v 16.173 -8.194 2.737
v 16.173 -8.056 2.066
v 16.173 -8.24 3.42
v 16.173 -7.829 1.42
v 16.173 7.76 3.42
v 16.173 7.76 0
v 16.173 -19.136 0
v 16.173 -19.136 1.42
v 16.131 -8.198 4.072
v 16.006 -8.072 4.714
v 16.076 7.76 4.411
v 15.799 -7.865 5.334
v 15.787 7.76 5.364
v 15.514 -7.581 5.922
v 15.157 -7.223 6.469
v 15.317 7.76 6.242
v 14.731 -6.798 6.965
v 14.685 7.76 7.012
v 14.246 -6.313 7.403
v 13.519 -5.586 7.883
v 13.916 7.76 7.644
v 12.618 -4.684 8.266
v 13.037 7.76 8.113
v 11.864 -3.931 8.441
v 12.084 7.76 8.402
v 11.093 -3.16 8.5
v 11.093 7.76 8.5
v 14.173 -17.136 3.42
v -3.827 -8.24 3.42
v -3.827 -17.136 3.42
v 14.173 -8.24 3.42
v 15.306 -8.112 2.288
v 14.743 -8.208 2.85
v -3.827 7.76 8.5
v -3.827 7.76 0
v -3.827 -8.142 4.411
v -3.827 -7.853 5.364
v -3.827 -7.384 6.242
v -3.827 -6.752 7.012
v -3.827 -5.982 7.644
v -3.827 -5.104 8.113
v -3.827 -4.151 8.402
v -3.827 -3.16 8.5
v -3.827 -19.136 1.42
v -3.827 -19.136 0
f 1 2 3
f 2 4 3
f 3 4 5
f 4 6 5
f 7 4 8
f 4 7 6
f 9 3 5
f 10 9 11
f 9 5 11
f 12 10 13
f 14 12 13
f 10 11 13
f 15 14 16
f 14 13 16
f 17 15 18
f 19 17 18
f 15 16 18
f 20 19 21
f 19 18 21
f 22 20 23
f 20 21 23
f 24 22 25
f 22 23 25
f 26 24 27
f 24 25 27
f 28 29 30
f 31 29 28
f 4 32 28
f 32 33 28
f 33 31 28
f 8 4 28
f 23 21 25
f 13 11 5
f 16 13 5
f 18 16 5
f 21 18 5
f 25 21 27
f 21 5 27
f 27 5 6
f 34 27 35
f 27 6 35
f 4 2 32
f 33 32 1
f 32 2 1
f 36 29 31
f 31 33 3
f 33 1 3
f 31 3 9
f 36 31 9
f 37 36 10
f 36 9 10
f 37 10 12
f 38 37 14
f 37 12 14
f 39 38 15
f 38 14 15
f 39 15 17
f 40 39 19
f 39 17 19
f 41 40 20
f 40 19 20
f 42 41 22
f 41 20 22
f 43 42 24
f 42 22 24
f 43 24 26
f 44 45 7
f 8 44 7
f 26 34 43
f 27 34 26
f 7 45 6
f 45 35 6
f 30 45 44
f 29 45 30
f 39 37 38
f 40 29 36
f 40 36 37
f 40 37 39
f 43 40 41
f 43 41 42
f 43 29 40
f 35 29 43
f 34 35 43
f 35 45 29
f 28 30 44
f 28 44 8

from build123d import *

# Parameters (mm, degrees)
F1_DEPTH = 8.5
F2_R     = 5.08
F3_DEPTH = 10.8966
F4_SIZE  = 2


# Not quite as in the source:
# - a feature of the source that left no trace in its solid (it failed there, or was rolled back) is left out


with BuildPart() as f1:
    # F0 (on Top) → F1 (new body)
    with BuildSketch(Plane.XY):
        with BuildLine():
            Line((8.9732294485, 7.7602798555), (-3.8267705515, 7.7602798555))
            Line((-3.8267705515, 7.7602798555), (-3.8267705515, -8.2397201445))
            ThreePointArc((-3.8267705515, -8.2397201445), (-0.2330190264, 2.0052786354), (8.9732294485, 7.7602798555))
        make_face()
        with BuildLine():
            Line((16.1732294485, 7.7602798555), (8.9732294485, 7.7602798555))
            ThreePointArc((8.9732294485, 7.7602798555), (-0.2330190264, 2.0052786354), (-3.8267705515, -8.2397201445))
            Line((-3.8267705515, -8.2397201445), (16.1732294485, -8.2397201445))
            Line((16.1732294485, -8.2397201445), (16.1732294485, 7.7602798555))
        make_face()
    extrude(amount=F1_DEPTH)

    # F2
    f2_edges = [f1.edges().sort_by_distance(p)[0] for p in [
        (16.173229, -0.23972, 8.5),
        (6.173229, -8.23972, 8.5),
    ]]
    fillet(f2_edges, radius=F2_R)

    # F3 (add): a face of the model
    f3_faces = [f1.faces().sort_by_distance(p)[0] for p in [
        (6.1732294485, -8.2397201445, 1.71),
    ]]
    extrude(f3_faces, amount=F3_DEPTH)

    # F4
    f4_edges = [f1.edges().sort_by_distance(p)[0] for p in [
        (16.173229, -13.68802, 3.42),
        (6.173229, -19.13632, 3.42),
    ]]
    chamfer(f4_edges, length=F4_SIZE)


solid = f1.part
